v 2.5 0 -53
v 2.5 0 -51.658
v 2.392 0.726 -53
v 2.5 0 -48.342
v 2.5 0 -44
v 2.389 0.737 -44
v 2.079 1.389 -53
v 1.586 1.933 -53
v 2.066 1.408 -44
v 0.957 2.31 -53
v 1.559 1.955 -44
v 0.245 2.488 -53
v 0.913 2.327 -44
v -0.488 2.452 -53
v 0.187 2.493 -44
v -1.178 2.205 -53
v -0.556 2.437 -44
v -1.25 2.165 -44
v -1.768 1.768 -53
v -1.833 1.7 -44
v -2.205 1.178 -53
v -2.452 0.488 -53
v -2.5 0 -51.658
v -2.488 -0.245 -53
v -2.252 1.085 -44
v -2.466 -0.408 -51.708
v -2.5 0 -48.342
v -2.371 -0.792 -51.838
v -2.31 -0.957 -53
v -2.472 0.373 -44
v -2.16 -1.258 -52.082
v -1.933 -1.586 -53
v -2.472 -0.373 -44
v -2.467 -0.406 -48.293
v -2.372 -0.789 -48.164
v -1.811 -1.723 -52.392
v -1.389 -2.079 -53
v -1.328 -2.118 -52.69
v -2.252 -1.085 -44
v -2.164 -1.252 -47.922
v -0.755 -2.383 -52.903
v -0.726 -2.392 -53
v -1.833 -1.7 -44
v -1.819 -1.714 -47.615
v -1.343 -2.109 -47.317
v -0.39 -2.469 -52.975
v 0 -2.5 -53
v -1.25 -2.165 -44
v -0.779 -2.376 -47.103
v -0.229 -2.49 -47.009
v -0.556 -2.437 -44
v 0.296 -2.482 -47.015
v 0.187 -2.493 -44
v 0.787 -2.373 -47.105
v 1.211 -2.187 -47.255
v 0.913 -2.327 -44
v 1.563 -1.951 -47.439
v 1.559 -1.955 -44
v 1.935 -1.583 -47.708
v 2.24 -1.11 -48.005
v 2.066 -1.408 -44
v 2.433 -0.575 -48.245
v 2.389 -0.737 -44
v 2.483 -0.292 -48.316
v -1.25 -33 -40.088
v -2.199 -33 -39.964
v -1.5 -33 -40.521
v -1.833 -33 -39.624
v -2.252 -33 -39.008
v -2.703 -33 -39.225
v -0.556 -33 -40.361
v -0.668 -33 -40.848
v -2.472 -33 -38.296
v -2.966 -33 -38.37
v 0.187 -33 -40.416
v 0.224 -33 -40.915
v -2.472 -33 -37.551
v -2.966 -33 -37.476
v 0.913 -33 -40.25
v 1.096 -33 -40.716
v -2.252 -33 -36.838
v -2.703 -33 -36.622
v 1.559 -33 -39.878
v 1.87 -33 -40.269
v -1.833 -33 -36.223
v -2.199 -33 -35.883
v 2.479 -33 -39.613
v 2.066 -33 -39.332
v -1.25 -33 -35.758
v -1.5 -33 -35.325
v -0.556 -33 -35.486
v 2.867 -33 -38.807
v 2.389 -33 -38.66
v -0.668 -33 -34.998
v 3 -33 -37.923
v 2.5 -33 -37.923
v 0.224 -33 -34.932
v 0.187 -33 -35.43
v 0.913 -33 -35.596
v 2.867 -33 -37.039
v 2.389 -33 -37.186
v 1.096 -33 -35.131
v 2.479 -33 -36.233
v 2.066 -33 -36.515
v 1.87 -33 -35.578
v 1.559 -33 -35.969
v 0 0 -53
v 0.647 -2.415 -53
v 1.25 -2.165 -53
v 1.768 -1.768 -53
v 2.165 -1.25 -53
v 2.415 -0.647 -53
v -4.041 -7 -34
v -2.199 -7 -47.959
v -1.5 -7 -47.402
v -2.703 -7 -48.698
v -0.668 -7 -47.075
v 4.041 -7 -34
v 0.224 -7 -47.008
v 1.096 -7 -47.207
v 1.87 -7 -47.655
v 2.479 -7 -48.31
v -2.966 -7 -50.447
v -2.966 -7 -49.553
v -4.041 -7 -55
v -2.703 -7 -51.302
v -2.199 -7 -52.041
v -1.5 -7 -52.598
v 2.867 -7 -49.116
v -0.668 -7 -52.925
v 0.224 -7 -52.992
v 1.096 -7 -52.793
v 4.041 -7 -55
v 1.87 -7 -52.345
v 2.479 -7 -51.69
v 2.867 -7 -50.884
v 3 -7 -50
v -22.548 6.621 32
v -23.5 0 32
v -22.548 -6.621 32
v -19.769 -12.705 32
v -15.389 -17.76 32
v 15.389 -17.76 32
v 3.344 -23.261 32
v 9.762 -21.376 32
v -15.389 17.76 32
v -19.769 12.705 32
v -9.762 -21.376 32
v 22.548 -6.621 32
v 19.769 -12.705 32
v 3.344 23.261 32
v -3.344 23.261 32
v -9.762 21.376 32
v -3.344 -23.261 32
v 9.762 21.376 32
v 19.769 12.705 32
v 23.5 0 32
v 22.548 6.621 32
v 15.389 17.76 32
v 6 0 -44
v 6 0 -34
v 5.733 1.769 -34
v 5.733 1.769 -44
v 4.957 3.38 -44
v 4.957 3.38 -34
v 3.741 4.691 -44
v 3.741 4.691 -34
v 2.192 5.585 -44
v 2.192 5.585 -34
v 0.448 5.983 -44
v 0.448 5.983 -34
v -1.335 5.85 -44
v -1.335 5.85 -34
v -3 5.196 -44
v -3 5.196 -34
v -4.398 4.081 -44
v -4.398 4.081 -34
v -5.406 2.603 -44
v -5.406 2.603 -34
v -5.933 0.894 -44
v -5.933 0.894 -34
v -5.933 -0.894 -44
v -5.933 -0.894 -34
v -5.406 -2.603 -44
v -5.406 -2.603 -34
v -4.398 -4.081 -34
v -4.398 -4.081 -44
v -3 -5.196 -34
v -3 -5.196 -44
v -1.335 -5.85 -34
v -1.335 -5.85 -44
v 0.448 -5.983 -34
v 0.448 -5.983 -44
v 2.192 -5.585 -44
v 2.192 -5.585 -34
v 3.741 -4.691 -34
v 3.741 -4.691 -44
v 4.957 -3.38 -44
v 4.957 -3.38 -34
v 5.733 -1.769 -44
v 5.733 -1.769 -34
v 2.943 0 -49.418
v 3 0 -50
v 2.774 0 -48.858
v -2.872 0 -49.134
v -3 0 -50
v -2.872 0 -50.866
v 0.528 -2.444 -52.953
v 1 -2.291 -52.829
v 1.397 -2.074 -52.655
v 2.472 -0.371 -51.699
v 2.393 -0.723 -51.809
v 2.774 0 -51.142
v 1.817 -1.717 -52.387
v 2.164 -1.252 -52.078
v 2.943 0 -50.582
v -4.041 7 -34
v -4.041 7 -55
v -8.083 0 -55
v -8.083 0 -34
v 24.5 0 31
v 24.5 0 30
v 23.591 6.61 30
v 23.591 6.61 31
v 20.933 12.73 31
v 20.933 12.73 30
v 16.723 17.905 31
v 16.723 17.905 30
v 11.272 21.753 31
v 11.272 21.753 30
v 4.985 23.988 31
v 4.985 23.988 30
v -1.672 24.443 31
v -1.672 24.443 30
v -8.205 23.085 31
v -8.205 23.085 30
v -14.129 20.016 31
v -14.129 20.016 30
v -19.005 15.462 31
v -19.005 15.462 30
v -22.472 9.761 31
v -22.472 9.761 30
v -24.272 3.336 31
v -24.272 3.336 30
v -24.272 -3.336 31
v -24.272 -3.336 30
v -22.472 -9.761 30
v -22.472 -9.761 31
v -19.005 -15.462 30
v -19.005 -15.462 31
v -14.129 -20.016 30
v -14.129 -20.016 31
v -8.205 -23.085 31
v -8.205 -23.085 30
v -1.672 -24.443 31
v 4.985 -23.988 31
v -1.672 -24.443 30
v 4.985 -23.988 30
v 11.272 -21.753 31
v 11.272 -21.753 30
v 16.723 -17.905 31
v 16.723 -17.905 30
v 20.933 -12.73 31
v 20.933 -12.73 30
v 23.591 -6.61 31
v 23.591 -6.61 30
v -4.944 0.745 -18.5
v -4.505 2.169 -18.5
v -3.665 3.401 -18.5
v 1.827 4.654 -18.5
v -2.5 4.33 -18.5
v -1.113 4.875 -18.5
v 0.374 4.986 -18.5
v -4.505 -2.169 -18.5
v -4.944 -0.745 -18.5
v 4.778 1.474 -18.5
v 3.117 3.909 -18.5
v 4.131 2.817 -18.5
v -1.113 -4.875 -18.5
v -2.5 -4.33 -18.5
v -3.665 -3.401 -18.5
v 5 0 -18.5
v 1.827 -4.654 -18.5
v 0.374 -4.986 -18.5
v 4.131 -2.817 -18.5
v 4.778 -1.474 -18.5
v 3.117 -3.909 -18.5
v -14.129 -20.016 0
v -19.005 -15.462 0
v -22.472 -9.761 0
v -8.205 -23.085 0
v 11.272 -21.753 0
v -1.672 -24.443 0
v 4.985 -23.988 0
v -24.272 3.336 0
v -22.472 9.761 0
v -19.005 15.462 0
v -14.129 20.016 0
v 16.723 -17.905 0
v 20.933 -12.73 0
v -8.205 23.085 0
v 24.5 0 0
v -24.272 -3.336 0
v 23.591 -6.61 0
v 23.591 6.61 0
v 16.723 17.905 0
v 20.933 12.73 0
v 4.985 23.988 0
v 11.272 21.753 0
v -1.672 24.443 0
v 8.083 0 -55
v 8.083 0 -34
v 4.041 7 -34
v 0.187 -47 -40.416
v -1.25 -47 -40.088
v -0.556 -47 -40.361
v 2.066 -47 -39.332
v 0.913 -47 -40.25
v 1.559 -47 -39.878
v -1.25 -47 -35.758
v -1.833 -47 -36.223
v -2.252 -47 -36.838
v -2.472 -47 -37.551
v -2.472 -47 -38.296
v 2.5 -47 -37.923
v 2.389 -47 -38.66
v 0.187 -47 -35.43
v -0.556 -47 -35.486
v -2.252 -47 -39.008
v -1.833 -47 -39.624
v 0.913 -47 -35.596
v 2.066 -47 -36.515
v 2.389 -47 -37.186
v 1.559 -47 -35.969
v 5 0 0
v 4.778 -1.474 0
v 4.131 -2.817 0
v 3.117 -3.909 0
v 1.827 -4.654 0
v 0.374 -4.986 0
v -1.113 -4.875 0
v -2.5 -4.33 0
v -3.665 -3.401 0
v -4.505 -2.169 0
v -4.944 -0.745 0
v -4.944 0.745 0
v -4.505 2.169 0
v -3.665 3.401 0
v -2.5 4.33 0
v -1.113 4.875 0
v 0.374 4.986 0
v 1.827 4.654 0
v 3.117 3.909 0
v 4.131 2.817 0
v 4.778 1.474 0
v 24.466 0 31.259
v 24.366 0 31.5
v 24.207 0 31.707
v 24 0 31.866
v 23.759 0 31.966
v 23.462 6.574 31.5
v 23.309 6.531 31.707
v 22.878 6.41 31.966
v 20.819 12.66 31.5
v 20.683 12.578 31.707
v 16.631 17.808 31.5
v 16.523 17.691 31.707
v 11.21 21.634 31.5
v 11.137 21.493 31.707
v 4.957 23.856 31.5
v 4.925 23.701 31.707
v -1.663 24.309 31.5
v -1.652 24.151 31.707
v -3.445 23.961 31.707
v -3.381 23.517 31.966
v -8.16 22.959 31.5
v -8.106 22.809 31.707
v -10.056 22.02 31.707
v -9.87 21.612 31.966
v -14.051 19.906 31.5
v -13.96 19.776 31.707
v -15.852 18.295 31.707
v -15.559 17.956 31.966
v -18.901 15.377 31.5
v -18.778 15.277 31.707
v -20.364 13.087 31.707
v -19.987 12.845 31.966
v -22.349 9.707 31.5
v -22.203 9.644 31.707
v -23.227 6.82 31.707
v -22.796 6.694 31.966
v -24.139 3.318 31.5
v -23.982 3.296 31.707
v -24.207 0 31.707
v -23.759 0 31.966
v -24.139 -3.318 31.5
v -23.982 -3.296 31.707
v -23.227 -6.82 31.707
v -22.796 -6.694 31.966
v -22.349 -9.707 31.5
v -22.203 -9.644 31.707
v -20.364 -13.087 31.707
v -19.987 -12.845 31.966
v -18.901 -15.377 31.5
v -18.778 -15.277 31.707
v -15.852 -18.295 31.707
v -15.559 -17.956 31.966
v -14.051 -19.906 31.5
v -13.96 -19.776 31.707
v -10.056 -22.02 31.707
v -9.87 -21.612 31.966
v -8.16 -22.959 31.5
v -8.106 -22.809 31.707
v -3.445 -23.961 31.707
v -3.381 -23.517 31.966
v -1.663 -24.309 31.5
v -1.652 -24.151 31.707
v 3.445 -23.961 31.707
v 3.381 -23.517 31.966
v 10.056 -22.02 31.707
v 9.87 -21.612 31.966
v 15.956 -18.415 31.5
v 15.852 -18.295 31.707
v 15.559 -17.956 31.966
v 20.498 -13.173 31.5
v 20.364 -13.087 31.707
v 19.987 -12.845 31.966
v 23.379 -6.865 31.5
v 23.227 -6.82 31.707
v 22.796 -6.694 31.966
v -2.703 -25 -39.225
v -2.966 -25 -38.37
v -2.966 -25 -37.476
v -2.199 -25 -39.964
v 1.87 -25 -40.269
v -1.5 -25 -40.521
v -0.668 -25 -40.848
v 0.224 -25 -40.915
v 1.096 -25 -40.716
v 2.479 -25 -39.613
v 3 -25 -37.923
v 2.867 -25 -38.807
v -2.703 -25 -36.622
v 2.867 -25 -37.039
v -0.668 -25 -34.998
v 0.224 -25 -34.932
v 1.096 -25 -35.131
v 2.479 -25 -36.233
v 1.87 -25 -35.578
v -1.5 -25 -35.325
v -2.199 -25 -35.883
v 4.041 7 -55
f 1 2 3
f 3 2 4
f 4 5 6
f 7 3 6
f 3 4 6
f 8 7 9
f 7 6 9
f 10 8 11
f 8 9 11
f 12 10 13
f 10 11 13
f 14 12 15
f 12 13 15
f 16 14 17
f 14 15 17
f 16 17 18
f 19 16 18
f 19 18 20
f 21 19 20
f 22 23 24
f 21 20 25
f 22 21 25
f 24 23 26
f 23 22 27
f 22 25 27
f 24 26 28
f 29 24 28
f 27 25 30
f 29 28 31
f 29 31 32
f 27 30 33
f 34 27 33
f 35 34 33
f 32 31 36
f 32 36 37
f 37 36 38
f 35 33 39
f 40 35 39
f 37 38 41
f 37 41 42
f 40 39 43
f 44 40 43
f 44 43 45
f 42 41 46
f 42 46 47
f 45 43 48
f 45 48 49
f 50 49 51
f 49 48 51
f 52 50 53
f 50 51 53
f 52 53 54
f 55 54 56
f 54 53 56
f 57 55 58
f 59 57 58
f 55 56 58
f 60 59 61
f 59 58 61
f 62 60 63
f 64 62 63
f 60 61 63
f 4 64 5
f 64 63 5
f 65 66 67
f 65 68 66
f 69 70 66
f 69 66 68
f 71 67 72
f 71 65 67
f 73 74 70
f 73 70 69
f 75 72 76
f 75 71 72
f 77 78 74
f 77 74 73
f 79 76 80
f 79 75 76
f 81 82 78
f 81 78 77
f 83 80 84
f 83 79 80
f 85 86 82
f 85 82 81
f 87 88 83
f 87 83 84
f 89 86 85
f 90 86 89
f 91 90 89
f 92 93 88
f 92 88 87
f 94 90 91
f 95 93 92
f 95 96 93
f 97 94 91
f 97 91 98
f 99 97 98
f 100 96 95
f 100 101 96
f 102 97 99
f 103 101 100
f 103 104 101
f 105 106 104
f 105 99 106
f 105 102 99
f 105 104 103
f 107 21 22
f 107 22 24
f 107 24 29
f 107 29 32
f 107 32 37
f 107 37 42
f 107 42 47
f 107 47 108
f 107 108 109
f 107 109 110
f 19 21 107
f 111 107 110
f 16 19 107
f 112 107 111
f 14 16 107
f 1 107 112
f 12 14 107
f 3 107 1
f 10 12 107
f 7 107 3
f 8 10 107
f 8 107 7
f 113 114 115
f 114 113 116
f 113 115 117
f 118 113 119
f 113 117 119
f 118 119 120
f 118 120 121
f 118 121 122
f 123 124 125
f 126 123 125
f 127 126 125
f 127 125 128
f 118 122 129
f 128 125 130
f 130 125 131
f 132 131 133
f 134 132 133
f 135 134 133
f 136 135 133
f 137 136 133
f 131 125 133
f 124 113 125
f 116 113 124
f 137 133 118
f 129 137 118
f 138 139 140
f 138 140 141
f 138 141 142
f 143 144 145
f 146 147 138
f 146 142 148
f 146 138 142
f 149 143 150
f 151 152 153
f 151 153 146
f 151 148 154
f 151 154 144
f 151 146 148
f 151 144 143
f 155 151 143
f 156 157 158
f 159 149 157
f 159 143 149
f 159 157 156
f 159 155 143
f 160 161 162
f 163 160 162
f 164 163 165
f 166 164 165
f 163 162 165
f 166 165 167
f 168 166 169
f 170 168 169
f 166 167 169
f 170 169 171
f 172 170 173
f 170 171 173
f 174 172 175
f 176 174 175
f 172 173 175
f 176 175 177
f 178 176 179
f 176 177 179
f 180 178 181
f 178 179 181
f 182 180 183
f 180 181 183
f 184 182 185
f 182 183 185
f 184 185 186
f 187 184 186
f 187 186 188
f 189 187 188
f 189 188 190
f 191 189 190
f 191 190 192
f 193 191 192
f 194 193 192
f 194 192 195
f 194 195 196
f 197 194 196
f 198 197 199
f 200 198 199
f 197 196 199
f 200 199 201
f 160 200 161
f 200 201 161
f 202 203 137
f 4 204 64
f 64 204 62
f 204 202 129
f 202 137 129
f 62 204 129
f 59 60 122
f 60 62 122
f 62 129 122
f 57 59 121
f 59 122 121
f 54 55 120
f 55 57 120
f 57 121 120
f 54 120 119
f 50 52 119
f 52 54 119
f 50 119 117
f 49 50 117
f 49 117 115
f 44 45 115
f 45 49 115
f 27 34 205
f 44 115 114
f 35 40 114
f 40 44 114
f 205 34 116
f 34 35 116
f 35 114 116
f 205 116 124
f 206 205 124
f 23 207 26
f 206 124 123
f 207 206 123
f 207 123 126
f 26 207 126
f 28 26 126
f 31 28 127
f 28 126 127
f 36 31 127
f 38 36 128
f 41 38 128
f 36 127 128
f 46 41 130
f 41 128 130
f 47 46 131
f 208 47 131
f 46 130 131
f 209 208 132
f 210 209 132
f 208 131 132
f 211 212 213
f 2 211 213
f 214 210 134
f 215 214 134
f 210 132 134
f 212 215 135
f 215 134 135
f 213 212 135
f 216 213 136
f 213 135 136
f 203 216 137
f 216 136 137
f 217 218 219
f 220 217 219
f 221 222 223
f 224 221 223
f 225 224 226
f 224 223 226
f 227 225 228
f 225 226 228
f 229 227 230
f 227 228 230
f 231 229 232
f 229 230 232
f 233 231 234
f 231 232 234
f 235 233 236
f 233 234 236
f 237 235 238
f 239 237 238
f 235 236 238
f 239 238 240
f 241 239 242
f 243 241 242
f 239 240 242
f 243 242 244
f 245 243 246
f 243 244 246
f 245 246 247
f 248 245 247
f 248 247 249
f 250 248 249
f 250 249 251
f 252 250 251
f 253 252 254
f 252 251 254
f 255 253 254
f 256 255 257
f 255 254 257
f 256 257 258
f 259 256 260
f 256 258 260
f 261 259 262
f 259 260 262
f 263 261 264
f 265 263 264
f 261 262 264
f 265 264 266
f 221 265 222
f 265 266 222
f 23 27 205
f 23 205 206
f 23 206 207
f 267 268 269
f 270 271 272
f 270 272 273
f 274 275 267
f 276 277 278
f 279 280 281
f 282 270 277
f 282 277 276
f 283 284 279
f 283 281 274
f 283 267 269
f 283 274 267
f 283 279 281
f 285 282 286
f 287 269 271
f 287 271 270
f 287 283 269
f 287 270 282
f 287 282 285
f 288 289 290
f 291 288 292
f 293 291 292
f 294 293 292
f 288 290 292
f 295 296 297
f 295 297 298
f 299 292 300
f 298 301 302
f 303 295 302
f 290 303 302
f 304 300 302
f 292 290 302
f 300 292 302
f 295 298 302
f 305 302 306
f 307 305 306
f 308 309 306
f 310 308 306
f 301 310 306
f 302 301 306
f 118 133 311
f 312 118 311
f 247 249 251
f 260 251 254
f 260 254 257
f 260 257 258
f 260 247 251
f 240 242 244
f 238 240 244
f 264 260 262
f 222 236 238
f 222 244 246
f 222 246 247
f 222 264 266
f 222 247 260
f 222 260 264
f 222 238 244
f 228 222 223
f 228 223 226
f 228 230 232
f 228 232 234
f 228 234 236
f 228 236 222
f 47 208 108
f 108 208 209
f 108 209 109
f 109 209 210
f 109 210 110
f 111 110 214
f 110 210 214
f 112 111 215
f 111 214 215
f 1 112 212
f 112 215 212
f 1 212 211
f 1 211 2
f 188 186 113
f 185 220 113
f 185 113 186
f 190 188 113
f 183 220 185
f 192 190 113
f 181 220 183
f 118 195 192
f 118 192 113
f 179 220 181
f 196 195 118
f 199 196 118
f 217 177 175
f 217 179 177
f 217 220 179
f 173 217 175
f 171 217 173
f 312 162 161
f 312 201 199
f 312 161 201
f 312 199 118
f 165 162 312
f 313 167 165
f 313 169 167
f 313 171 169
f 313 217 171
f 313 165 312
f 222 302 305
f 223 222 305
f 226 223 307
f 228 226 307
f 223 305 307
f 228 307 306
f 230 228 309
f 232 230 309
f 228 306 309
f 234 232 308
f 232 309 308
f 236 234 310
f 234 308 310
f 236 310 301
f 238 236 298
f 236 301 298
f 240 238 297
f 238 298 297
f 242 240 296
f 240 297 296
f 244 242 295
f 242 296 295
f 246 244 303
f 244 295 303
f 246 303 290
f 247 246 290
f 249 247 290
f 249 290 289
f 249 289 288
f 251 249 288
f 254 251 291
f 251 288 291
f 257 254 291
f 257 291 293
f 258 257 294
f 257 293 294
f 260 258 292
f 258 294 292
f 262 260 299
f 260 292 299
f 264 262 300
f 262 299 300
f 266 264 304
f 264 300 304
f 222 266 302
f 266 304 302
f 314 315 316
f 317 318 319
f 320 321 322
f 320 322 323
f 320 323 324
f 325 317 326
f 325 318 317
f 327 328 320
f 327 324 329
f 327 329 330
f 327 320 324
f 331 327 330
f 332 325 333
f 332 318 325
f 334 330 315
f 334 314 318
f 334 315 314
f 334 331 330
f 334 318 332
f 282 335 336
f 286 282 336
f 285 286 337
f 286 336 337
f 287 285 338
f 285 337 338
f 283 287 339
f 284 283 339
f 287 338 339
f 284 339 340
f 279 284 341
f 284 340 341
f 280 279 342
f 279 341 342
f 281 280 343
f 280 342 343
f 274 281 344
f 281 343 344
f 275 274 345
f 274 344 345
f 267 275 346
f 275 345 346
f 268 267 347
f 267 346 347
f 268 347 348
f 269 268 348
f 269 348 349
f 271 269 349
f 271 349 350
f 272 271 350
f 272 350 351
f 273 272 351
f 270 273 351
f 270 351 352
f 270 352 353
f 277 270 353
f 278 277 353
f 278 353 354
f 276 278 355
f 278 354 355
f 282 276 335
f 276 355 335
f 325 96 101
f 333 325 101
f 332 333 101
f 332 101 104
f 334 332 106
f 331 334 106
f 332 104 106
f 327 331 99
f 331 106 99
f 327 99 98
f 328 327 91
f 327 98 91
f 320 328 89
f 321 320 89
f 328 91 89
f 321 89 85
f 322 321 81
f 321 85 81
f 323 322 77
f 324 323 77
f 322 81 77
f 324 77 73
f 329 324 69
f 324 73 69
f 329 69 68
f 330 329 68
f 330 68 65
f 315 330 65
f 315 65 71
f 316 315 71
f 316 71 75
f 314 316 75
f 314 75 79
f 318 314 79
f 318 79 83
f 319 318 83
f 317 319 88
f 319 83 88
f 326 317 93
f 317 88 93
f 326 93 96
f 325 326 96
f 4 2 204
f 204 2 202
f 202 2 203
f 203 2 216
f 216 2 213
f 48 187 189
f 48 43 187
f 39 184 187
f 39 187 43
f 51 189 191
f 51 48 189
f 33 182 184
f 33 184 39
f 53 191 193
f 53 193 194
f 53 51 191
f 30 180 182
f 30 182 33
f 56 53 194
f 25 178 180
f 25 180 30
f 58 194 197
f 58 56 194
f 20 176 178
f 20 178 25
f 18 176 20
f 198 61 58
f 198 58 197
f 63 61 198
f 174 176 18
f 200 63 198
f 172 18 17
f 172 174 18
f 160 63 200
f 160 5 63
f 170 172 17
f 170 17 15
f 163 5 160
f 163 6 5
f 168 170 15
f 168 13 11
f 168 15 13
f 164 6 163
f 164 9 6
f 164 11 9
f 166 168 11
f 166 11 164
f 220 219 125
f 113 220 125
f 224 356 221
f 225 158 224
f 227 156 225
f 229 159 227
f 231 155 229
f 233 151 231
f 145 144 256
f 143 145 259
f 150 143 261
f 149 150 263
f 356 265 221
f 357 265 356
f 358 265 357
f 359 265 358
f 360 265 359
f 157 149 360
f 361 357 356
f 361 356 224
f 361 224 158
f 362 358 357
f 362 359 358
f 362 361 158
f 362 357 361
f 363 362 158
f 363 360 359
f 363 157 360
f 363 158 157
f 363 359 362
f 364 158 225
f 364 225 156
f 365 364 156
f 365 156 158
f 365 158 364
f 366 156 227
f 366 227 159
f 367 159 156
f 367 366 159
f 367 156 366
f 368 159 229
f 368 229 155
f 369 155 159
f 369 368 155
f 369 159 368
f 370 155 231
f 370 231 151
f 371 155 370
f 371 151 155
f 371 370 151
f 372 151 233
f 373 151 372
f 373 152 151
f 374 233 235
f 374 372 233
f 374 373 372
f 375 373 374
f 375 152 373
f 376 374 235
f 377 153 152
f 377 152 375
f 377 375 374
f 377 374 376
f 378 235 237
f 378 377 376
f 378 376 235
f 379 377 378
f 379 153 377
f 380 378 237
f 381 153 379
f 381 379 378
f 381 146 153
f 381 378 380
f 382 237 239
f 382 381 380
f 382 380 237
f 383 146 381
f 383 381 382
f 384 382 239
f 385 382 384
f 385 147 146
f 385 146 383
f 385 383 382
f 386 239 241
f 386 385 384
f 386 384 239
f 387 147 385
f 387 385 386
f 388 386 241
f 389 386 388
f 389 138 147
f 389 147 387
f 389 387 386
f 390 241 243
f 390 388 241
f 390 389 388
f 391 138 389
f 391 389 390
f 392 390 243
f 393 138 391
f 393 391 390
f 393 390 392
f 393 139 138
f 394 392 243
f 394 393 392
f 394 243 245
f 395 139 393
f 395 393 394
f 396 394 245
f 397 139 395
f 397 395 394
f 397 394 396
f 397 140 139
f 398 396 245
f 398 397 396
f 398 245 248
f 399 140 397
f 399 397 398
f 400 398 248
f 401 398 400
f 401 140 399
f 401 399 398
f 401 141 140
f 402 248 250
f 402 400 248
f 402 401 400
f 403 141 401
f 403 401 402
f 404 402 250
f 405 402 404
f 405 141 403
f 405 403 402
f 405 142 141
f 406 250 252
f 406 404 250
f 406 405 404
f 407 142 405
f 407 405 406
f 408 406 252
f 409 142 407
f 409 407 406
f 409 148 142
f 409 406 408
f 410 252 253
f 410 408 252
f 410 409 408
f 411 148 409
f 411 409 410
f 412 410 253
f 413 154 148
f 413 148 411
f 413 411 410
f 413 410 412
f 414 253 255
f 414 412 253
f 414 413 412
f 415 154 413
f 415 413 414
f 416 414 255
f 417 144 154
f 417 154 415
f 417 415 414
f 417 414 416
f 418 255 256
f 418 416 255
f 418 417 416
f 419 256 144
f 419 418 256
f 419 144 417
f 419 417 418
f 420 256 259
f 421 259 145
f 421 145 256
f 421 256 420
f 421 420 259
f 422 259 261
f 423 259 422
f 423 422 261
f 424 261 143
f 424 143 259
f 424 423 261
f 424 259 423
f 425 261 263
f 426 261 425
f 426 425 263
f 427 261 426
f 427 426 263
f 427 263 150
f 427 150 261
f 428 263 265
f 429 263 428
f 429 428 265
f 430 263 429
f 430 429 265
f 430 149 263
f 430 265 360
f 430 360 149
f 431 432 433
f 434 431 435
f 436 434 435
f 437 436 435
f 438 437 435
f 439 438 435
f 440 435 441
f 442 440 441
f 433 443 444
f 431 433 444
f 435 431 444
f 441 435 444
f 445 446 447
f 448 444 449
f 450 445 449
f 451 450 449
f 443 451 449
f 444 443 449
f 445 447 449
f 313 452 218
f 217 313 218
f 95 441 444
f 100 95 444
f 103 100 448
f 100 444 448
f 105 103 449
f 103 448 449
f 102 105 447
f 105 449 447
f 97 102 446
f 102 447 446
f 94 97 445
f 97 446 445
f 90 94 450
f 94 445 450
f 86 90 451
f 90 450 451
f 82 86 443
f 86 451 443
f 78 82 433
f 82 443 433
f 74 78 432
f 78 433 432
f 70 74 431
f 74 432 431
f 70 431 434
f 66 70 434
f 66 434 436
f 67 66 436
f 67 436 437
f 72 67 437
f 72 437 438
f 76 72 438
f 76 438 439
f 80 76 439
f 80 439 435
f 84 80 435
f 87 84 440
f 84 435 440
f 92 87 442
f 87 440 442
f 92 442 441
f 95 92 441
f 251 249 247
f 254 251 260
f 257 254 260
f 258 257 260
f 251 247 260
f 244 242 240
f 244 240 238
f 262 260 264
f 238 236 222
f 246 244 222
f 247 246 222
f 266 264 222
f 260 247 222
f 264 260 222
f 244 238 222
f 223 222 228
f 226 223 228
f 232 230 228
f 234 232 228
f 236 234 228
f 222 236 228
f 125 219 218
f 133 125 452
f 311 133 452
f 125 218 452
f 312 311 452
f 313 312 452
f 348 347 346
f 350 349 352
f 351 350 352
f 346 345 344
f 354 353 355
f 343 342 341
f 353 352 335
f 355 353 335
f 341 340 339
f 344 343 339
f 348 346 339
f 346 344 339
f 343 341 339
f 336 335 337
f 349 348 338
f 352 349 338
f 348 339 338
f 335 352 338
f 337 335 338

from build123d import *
from build123d import SkipClean  # not in build123d's __all__

# Parameters (mm, degrees)
F0_R      = 24.5
F1_DEPTH  = 30
F2_R      = 5
F3_DEPTH  = 18.5
F6_DEPTH  = 21
F7_R      = 6
F8_DEPTH  = 10
F9_R      = 2.5
F10_DEPTH = 9
F11_R     = 3
F12_DEPTH = 7
F14_R     = 3
F15_DEPTH = 8
F16_R     = 2.5
F17_DEPTH = 14
F18_R     = 24.5
F19_DEPTH = 2
F20_R     = 1


with BuildPart() as f1:
    # F0 (on Top) → F1 (new body)
    with BuildSketch(Plane.XY):
        Circle(F0_R)
    extrude(amount=F1_DEPTH)


with BuildPart() as f3:
    # F2 (on face) → F3 (new body)
    with BuildSketch(Plane(origin=(0, 0, 0), x_dir=(1, 0, 0), z_dir=(0, 0, -1))):
        Circle(F2_R)
    extrude(amount=F3_DEPTH)


with BuildPart() as f6:
    # F5 (on offset) → F6 (new body)
    with BuildSketch(Plane.XY.offset(-55)):
        Polygon((4.0414518843, 7), (-4.0414518843, 7), (-8.0829037687, 0), (-4.0414518843, -7), (4.0414518843, -7), (8.0829037687, 0), align=None)
    extrude(amount=F6_DEPTH)

    # F7 (on face) → F8 (cut)
    with BuildSketch(Plane.XY.offset(-34)):
        Circle(F7_R)
    extrude(amount=-F8_DEPTH, mode=Mode.SUBTRACT)

    # F9 (on face) → F10 (cut)
    with BuildSketch(Plane.XY.offset(-44)):
        Circle(F9_R)
    extrude(amount=-F10_DEPTH, mode=Mode.SUBTRACT)

    # F11 (on face) → F12 (cut)
    with BuildSketch(Plane.XZ.offset(7)):
        with Locations((0, -50)):
            Circle(F11_R)
    with SkipClean():  # cleaning this boolean's faces spoils the solid; the shape is the same uncleaned
        extrude(amount=-F12_DEPTH, mode=Mode.SUBTRACT)


with BuildPart() as f15:
    # F14 (on offset) → F15 (new body)
    with BuildSketch(Plane.XZ.offset(25)):
        with Locations((0, -37.9232009678)):
            Circle(F14_R)
    extrude(amount=F15_DEPTH)

    # F16 (on face) → F17 (join)
    with BuildSketch(Plane.XZ.offset(33)):
        with Locations((0, -37.9232009678)):
            Circle(F16_R)
    extrude(amount=F17_DEPTH)


with BuildPart() as f19:
    # F18 (on face) → F19 (new body)
    with BuildSketch(Plane.XY.offset(30)):
        Circle(F18_R)
    extrude(amount=F19_DEPTH)

    # F20
    f20_edges = [f19.edges().sort_by_distance(p)[0] for p in [
        (-24.5, 0, 32),
    ]]
    fillet(f20_edges, radius=F20_R)


solid = Compound([f1.part, f3.part, f6.part, f15.part, f19.part])
